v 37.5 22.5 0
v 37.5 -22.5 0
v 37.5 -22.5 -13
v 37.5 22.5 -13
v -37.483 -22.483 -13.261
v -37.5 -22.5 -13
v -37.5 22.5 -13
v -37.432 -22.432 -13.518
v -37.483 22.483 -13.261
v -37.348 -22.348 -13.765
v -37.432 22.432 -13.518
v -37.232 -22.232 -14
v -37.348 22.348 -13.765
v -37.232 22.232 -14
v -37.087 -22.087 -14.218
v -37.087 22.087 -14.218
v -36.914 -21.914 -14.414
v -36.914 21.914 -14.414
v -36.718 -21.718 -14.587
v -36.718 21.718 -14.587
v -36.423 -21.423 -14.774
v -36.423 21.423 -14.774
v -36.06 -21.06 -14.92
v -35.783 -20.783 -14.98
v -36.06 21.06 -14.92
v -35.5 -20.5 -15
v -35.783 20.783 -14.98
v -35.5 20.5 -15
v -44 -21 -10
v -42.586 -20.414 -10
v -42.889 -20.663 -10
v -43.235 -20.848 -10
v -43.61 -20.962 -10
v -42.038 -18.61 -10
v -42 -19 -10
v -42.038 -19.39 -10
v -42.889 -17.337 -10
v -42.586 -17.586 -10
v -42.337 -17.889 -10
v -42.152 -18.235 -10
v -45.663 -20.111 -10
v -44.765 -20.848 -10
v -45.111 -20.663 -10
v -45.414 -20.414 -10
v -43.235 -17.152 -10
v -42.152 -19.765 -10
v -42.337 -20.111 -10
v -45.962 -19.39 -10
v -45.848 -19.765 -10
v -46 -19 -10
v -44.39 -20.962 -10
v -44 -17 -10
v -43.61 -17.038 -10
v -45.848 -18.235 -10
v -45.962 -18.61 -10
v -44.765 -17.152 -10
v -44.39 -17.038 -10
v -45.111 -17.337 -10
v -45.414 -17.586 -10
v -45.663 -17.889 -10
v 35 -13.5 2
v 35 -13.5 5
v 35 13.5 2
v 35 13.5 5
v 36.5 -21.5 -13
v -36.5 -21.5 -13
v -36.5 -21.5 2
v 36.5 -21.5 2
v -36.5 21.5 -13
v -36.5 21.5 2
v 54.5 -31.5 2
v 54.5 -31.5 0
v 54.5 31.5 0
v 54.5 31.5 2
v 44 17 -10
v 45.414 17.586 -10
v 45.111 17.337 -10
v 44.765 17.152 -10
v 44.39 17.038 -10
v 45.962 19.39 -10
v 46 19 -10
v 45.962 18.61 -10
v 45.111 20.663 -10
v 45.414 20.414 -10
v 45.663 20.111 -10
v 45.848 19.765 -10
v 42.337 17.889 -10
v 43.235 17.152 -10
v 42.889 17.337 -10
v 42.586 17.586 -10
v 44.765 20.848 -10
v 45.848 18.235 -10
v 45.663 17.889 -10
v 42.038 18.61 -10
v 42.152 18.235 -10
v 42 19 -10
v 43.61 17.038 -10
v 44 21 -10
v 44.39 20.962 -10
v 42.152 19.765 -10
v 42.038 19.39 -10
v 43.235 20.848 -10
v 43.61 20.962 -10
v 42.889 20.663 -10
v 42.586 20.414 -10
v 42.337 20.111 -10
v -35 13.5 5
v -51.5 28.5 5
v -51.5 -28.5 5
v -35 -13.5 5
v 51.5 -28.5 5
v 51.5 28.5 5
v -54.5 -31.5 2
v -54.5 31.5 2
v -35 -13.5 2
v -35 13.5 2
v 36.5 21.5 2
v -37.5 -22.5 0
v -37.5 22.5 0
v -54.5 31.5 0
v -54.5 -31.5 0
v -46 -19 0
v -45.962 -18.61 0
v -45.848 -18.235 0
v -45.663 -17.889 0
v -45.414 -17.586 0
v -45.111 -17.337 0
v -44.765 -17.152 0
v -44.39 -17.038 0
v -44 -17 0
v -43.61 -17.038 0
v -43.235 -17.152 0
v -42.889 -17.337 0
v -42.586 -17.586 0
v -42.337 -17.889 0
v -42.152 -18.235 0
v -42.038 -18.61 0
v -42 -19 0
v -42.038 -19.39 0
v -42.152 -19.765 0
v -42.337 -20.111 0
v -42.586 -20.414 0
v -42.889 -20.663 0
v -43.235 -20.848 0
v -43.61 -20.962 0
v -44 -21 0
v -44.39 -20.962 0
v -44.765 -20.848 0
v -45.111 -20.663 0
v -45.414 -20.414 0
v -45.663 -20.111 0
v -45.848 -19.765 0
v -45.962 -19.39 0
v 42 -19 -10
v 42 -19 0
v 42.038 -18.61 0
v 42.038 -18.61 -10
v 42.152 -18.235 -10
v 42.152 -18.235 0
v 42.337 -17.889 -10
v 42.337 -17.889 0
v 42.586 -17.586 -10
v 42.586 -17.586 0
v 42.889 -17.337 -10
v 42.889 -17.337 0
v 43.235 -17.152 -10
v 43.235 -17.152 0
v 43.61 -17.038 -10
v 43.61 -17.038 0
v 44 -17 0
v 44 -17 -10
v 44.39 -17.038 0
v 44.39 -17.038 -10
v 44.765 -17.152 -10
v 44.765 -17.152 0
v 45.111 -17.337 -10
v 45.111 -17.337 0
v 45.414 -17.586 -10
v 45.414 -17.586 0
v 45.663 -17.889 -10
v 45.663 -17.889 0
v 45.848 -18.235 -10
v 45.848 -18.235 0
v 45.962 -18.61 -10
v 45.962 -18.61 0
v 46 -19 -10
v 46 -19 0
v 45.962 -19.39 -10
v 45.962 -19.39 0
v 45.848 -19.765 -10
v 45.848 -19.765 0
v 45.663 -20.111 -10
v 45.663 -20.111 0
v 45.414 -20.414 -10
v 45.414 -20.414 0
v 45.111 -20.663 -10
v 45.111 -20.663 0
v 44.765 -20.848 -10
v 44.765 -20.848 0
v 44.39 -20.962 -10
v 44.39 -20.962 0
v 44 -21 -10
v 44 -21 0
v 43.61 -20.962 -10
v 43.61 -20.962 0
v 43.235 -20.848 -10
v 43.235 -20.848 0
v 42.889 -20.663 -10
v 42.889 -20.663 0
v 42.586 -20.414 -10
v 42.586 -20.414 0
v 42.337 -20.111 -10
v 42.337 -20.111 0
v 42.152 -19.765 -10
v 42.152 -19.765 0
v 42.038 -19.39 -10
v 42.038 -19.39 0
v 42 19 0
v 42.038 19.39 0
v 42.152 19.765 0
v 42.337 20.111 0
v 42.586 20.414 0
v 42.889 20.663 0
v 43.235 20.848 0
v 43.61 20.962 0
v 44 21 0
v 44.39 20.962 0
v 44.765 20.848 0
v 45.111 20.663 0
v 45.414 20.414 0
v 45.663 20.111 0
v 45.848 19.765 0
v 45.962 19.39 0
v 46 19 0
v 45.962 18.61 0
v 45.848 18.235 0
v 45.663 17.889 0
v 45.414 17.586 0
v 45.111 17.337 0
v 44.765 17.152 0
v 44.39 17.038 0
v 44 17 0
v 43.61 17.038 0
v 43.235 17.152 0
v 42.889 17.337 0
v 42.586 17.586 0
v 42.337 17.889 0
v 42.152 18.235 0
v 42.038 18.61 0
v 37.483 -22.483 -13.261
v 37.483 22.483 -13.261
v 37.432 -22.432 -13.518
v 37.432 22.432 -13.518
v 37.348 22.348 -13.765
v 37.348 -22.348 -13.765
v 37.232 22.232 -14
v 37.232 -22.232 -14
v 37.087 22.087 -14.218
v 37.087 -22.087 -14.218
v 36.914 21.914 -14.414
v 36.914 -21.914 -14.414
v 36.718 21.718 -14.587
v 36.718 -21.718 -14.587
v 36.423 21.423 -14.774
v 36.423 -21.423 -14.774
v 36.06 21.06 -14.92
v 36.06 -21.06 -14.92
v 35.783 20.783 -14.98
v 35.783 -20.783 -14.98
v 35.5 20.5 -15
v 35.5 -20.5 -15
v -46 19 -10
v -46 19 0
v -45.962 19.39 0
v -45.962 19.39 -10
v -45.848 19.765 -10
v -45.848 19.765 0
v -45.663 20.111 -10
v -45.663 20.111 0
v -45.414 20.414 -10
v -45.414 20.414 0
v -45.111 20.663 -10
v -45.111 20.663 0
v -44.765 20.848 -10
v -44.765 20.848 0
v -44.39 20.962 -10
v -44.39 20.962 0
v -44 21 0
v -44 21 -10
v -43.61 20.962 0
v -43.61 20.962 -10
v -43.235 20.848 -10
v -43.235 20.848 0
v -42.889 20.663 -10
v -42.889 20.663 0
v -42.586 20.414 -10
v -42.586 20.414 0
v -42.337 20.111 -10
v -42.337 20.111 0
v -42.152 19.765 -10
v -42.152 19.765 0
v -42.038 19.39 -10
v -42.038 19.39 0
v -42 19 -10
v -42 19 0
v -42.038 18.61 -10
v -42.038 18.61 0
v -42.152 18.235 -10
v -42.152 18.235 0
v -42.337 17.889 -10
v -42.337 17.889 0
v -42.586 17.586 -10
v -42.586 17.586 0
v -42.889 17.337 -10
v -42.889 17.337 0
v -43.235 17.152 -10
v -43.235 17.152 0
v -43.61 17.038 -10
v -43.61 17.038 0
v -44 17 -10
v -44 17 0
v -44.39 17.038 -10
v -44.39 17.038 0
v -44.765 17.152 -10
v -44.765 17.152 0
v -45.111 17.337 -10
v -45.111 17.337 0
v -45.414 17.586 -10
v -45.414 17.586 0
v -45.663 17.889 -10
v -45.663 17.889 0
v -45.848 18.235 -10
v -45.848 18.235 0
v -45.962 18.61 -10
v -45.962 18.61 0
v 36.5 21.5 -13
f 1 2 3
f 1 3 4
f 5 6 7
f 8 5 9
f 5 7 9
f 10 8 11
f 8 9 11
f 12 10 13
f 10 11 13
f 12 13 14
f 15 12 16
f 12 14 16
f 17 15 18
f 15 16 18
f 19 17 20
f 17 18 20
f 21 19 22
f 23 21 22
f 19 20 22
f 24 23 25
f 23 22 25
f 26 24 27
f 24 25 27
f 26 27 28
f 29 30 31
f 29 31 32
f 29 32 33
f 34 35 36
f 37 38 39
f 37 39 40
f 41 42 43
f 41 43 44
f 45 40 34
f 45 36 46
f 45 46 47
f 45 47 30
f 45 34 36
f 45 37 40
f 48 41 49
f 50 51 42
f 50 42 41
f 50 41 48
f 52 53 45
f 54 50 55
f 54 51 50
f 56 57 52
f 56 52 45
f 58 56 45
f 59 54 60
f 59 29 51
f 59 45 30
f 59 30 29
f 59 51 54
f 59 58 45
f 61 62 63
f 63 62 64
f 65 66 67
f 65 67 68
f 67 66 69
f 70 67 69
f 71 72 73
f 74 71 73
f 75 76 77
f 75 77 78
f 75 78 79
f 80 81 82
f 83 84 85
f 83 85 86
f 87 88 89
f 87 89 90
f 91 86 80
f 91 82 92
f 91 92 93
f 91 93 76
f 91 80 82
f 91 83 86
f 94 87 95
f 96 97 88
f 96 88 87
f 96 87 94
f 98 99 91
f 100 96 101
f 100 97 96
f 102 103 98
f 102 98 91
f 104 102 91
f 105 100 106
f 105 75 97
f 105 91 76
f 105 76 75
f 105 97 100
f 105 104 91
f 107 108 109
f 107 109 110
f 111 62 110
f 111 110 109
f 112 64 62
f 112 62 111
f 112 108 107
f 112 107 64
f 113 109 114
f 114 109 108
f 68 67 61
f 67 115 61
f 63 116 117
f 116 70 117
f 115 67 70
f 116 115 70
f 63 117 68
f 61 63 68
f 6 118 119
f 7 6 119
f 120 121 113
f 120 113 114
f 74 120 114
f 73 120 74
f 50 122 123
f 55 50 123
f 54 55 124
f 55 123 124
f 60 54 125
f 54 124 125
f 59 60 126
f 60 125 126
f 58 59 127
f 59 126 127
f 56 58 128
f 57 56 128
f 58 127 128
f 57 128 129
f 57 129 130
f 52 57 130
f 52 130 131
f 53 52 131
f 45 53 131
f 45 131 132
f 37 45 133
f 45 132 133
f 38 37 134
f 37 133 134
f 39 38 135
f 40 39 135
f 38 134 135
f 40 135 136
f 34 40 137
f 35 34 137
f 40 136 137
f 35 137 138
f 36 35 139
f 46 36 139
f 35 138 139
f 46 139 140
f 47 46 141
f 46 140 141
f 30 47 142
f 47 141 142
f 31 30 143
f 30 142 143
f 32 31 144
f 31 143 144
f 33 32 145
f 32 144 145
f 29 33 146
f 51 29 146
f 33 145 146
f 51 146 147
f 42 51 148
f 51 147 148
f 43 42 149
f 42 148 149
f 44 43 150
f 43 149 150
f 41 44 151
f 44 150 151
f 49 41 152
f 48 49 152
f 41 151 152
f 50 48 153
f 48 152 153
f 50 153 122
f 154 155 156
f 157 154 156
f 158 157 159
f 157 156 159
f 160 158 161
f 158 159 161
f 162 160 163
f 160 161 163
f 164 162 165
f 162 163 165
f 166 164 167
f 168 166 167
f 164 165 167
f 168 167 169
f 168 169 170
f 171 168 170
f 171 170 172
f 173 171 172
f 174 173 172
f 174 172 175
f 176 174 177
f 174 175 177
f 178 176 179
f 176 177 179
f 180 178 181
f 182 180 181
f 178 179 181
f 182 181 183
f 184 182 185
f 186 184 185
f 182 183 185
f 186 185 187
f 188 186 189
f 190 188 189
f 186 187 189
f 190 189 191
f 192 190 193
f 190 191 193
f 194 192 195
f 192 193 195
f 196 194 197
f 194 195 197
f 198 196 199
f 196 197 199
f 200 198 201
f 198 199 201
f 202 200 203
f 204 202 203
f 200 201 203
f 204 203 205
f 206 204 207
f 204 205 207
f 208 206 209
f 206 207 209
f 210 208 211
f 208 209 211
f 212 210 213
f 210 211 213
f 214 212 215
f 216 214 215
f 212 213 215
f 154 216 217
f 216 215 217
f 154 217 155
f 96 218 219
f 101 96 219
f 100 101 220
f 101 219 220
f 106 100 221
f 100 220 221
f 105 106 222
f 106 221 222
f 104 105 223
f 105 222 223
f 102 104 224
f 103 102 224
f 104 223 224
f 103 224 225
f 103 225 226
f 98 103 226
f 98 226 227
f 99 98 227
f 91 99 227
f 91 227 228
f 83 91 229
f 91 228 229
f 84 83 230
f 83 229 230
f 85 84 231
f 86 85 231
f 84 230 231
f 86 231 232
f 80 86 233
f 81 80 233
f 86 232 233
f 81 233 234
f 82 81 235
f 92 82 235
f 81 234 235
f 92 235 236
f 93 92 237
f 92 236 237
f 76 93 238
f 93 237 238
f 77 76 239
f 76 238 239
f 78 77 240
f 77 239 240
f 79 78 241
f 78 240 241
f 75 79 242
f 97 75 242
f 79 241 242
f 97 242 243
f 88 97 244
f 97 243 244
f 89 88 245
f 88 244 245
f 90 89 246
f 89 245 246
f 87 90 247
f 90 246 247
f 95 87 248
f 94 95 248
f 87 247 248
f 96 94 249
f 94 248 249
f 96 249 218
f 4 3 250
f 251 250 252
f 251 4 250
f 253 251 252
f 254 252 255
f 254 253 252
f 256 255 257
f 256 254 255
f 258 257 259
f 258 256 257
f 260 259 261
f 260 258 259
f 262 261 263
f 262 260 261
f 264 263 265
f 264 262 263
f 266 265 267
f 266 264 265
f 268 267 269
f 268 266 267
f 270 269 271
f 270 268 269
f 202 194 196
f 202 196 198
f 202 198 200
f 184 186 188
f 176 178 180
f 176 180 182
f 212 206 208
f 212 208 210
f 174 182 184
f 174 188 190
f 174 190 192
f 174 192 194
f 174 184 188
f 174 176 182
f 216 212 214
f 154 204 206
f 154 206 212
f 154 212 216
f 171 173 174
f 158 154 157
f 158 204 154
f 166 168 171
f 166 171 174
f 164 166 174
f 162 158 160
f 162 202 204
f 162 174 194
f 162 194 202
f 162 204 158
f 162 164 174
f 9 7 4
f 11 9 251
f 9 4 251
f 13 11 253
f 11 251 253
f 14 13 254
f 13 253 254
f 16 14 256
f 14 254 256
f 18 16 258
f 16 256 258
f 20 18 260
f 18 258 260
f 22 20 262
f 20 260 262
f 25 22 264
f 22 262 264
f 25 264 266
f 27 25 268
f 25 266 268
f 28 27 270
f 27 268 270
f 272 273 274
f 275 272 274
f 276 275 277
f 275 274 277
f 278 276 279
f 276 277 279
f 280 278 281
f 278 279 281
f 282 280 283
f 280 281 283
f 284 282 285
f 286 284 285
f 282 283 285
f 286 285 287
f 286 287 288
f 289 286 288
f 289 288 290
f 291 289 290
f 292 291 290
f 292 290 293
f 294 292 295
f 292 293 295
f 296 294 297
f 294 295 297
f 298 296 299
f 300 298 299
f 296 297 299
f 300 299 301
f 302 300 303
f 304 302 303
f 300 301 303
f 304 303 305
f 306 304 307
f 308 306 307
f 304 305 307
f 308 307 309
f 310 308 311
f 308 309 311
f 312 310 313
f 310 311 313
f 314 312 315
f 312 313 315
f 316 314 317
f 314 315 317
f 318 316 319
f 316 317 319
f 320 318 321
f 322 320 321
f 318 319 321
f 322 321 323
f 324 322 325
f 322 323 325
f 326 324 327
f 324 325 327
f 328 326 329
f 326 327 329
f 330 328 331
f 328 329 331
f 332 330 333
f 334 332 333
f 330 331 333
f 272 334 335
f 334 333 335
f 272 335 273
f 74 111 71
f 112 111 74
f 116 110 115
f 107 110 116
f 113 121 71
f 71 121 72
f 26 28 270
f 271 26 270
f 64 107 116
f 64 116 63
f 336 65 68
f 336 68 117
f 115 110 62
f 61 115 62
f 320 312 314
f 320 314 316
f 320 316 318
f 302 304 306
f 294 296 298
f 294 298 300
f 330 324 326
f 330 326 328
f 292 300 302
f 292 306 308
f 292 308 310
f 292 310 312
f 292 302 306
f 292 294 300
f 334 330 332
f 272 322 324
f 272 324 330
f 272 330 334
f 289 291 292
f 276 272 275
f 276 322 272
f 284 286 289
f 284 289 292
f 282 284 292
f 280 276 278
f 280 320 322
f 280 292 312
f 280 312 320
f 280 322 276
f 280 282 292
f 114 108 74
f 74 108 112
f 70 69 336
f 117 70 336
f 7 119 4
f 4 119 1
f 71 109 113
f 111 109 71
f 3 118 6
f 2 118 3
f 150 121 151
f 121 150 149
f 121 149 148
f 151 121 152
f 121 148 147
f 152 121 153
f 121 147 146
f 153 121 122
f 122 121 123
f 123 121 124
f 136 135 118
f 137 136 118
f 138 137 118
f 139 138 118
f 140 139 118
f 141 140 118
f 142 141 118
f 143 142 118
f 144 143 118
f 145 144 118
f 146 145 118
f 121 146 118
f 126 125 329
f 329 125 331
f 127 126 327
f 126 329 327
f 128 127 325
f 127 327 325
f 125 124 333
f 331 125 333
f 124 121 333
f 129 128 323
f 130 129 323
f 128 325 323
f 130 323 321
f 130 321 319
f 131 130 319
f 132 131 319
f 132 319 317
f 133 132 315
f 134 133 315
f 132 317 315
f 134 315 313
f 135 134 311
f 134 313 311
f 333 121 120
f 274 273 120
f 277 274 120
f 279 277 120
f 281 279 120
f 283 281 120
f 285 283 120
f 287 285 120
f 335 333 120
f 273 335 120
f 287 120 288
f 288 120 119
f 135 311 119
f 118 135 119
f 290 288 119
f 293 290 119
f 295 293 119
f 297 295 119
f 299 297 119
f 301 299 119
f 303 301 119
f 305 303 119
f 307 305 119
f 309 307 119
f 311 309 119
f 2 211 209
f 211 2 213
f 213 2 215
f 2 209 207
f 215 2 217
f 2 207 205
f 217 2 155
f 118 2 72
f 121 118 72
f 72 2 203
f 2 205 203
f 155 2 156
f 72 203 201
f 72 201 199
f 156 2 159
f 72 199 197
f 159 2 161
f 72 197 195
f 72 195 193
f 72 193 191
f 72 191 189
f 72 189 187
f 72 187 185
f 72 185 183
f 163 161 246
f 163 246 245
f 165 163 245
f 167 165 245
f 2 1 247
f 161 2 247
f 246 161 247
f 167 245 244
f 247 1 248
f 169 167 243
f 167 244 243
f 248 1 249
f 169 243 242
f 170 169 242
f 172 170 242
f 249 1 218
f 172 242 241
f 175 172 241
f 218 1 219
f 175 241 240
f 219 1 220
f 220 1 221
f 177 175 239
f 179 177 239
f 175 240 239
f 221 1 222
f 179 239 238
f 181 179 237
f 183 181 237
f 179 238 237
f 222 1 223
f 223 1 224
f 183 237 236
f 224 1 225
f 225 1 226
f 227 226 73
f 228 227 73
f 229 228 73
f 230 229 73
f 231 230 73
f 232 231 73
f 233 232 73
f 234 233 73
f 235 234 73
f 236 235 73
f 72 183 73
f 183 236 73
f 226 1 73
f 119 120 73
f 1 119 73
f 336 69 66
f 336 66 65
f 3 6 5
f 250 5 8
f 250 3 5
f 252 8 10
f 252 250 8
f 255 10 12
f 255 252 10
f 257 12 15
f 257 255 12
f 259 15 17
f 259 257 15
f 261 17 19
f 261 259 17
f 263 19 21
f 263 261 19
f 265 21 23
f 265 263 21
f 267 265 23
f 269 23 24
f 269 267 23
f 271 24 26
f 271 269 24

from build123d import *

# Parameters (mm, degrees)
SKETCH_1_W          = 109
SKETCH_1_H          = 63
EXTRUDE_1_DEPTH     = 5
CHAMFER_1_SIZE      = 3
SKETCH_2_W          = 75
SKETCH_2_H          = 45
EXTRUDE_2_DEPTH     = 20
SKETCH_3_W          = 70
SKETCH_3_H          = 27
CUT_EXTRUDE_1_DEPTH = 18
SKETCH_4_W          = 73
SKETCH_4_H          = 43
CUT_EXTRUDE_2_DEPTH = 15
SKETCH_5_R          = 2
EXTRUDE_3_DEPTH     = 10
FILLET_1_R          = 2


with BuildPart() as part:
    # 草图1 → 凸台-拉伸1 (new body)
    with BuildSketch(Plane.XY):
        Rectangle(SKETCH_1_W, SKETCH_1_H)
    extrude(amount=EXTRUDE_1_DEPTH)

    # 倒角1
    chamfer_1_edges = [part.edges().sort_by_distance(p)[0] for p in [
        (-54.5, 0, 5),
        (0, -31.5, 5),
        (54.5, 0, 5),
        (0, 31.5, 5),
    ]]
    chamfer(chamfer_1_edges, length=CHAMFER_1_SIZE)

    # 草图2 → 凸台-拉伸2 (add)
    with BuildSketch(Plane.XY.offset(5)):
        Rectangle(SKETCH_2_W, SKETCH_2_H)
    extrude(amount=-EXTRUDE_2_DEPTH)

    # 草图3 → 切除-拉伸1 (cut)
    with BuildSketch(Plane.XY.offset(5)):
        Rectangle(SKETCH_3_W, SKETCH_3_H)
    extrude(amount=-CUT_EXTRUDE_1_DEPTH, mode=Mode.SUBTRACT)

    # 草图4 → 切除-拉伸2 (cut)
    with BuildSketch(Plane.XY.offset(-13)):
        Rectangle(SKETCH_4_W, SKETCH_4_H)
    extrude(amount=CUT_EXTRUDE_2_DEPTH, mode=Mode.SUBTRACT)

    # 草图5 → 凸台-拉伸3 (add)
    with BuildSketch(Plane(origin=(0, 0, 0), x_dir=(-1, 0, 0), z_dir=(0, 0, -1))):
        with Locations((44, 19)):
            Circle(SKETCH_5_R)
        with Locations((44, -19)):
            Circle(SKETCH_5_R)
        with Locations((-44, -19)):
            Circle(SKETCH_5_R)
        with Locations((-44, 19)):
            Circle(SKETCH_5_R)
    extrude(amount=EXTRUDE_3_DEPTH)

    # 圆角1
    fillet_1_edges = [part.edges().sort_by_distance(p)[0] for p in [
        (37.5, 0, -15),
        (0, -22.5, -15),
        (-37.5, 0, -15),
        (0, 22.5, -15),
    ]]
    fillet(fillet_1_edges, radius=FILLET_1_R)


solid = part.part
